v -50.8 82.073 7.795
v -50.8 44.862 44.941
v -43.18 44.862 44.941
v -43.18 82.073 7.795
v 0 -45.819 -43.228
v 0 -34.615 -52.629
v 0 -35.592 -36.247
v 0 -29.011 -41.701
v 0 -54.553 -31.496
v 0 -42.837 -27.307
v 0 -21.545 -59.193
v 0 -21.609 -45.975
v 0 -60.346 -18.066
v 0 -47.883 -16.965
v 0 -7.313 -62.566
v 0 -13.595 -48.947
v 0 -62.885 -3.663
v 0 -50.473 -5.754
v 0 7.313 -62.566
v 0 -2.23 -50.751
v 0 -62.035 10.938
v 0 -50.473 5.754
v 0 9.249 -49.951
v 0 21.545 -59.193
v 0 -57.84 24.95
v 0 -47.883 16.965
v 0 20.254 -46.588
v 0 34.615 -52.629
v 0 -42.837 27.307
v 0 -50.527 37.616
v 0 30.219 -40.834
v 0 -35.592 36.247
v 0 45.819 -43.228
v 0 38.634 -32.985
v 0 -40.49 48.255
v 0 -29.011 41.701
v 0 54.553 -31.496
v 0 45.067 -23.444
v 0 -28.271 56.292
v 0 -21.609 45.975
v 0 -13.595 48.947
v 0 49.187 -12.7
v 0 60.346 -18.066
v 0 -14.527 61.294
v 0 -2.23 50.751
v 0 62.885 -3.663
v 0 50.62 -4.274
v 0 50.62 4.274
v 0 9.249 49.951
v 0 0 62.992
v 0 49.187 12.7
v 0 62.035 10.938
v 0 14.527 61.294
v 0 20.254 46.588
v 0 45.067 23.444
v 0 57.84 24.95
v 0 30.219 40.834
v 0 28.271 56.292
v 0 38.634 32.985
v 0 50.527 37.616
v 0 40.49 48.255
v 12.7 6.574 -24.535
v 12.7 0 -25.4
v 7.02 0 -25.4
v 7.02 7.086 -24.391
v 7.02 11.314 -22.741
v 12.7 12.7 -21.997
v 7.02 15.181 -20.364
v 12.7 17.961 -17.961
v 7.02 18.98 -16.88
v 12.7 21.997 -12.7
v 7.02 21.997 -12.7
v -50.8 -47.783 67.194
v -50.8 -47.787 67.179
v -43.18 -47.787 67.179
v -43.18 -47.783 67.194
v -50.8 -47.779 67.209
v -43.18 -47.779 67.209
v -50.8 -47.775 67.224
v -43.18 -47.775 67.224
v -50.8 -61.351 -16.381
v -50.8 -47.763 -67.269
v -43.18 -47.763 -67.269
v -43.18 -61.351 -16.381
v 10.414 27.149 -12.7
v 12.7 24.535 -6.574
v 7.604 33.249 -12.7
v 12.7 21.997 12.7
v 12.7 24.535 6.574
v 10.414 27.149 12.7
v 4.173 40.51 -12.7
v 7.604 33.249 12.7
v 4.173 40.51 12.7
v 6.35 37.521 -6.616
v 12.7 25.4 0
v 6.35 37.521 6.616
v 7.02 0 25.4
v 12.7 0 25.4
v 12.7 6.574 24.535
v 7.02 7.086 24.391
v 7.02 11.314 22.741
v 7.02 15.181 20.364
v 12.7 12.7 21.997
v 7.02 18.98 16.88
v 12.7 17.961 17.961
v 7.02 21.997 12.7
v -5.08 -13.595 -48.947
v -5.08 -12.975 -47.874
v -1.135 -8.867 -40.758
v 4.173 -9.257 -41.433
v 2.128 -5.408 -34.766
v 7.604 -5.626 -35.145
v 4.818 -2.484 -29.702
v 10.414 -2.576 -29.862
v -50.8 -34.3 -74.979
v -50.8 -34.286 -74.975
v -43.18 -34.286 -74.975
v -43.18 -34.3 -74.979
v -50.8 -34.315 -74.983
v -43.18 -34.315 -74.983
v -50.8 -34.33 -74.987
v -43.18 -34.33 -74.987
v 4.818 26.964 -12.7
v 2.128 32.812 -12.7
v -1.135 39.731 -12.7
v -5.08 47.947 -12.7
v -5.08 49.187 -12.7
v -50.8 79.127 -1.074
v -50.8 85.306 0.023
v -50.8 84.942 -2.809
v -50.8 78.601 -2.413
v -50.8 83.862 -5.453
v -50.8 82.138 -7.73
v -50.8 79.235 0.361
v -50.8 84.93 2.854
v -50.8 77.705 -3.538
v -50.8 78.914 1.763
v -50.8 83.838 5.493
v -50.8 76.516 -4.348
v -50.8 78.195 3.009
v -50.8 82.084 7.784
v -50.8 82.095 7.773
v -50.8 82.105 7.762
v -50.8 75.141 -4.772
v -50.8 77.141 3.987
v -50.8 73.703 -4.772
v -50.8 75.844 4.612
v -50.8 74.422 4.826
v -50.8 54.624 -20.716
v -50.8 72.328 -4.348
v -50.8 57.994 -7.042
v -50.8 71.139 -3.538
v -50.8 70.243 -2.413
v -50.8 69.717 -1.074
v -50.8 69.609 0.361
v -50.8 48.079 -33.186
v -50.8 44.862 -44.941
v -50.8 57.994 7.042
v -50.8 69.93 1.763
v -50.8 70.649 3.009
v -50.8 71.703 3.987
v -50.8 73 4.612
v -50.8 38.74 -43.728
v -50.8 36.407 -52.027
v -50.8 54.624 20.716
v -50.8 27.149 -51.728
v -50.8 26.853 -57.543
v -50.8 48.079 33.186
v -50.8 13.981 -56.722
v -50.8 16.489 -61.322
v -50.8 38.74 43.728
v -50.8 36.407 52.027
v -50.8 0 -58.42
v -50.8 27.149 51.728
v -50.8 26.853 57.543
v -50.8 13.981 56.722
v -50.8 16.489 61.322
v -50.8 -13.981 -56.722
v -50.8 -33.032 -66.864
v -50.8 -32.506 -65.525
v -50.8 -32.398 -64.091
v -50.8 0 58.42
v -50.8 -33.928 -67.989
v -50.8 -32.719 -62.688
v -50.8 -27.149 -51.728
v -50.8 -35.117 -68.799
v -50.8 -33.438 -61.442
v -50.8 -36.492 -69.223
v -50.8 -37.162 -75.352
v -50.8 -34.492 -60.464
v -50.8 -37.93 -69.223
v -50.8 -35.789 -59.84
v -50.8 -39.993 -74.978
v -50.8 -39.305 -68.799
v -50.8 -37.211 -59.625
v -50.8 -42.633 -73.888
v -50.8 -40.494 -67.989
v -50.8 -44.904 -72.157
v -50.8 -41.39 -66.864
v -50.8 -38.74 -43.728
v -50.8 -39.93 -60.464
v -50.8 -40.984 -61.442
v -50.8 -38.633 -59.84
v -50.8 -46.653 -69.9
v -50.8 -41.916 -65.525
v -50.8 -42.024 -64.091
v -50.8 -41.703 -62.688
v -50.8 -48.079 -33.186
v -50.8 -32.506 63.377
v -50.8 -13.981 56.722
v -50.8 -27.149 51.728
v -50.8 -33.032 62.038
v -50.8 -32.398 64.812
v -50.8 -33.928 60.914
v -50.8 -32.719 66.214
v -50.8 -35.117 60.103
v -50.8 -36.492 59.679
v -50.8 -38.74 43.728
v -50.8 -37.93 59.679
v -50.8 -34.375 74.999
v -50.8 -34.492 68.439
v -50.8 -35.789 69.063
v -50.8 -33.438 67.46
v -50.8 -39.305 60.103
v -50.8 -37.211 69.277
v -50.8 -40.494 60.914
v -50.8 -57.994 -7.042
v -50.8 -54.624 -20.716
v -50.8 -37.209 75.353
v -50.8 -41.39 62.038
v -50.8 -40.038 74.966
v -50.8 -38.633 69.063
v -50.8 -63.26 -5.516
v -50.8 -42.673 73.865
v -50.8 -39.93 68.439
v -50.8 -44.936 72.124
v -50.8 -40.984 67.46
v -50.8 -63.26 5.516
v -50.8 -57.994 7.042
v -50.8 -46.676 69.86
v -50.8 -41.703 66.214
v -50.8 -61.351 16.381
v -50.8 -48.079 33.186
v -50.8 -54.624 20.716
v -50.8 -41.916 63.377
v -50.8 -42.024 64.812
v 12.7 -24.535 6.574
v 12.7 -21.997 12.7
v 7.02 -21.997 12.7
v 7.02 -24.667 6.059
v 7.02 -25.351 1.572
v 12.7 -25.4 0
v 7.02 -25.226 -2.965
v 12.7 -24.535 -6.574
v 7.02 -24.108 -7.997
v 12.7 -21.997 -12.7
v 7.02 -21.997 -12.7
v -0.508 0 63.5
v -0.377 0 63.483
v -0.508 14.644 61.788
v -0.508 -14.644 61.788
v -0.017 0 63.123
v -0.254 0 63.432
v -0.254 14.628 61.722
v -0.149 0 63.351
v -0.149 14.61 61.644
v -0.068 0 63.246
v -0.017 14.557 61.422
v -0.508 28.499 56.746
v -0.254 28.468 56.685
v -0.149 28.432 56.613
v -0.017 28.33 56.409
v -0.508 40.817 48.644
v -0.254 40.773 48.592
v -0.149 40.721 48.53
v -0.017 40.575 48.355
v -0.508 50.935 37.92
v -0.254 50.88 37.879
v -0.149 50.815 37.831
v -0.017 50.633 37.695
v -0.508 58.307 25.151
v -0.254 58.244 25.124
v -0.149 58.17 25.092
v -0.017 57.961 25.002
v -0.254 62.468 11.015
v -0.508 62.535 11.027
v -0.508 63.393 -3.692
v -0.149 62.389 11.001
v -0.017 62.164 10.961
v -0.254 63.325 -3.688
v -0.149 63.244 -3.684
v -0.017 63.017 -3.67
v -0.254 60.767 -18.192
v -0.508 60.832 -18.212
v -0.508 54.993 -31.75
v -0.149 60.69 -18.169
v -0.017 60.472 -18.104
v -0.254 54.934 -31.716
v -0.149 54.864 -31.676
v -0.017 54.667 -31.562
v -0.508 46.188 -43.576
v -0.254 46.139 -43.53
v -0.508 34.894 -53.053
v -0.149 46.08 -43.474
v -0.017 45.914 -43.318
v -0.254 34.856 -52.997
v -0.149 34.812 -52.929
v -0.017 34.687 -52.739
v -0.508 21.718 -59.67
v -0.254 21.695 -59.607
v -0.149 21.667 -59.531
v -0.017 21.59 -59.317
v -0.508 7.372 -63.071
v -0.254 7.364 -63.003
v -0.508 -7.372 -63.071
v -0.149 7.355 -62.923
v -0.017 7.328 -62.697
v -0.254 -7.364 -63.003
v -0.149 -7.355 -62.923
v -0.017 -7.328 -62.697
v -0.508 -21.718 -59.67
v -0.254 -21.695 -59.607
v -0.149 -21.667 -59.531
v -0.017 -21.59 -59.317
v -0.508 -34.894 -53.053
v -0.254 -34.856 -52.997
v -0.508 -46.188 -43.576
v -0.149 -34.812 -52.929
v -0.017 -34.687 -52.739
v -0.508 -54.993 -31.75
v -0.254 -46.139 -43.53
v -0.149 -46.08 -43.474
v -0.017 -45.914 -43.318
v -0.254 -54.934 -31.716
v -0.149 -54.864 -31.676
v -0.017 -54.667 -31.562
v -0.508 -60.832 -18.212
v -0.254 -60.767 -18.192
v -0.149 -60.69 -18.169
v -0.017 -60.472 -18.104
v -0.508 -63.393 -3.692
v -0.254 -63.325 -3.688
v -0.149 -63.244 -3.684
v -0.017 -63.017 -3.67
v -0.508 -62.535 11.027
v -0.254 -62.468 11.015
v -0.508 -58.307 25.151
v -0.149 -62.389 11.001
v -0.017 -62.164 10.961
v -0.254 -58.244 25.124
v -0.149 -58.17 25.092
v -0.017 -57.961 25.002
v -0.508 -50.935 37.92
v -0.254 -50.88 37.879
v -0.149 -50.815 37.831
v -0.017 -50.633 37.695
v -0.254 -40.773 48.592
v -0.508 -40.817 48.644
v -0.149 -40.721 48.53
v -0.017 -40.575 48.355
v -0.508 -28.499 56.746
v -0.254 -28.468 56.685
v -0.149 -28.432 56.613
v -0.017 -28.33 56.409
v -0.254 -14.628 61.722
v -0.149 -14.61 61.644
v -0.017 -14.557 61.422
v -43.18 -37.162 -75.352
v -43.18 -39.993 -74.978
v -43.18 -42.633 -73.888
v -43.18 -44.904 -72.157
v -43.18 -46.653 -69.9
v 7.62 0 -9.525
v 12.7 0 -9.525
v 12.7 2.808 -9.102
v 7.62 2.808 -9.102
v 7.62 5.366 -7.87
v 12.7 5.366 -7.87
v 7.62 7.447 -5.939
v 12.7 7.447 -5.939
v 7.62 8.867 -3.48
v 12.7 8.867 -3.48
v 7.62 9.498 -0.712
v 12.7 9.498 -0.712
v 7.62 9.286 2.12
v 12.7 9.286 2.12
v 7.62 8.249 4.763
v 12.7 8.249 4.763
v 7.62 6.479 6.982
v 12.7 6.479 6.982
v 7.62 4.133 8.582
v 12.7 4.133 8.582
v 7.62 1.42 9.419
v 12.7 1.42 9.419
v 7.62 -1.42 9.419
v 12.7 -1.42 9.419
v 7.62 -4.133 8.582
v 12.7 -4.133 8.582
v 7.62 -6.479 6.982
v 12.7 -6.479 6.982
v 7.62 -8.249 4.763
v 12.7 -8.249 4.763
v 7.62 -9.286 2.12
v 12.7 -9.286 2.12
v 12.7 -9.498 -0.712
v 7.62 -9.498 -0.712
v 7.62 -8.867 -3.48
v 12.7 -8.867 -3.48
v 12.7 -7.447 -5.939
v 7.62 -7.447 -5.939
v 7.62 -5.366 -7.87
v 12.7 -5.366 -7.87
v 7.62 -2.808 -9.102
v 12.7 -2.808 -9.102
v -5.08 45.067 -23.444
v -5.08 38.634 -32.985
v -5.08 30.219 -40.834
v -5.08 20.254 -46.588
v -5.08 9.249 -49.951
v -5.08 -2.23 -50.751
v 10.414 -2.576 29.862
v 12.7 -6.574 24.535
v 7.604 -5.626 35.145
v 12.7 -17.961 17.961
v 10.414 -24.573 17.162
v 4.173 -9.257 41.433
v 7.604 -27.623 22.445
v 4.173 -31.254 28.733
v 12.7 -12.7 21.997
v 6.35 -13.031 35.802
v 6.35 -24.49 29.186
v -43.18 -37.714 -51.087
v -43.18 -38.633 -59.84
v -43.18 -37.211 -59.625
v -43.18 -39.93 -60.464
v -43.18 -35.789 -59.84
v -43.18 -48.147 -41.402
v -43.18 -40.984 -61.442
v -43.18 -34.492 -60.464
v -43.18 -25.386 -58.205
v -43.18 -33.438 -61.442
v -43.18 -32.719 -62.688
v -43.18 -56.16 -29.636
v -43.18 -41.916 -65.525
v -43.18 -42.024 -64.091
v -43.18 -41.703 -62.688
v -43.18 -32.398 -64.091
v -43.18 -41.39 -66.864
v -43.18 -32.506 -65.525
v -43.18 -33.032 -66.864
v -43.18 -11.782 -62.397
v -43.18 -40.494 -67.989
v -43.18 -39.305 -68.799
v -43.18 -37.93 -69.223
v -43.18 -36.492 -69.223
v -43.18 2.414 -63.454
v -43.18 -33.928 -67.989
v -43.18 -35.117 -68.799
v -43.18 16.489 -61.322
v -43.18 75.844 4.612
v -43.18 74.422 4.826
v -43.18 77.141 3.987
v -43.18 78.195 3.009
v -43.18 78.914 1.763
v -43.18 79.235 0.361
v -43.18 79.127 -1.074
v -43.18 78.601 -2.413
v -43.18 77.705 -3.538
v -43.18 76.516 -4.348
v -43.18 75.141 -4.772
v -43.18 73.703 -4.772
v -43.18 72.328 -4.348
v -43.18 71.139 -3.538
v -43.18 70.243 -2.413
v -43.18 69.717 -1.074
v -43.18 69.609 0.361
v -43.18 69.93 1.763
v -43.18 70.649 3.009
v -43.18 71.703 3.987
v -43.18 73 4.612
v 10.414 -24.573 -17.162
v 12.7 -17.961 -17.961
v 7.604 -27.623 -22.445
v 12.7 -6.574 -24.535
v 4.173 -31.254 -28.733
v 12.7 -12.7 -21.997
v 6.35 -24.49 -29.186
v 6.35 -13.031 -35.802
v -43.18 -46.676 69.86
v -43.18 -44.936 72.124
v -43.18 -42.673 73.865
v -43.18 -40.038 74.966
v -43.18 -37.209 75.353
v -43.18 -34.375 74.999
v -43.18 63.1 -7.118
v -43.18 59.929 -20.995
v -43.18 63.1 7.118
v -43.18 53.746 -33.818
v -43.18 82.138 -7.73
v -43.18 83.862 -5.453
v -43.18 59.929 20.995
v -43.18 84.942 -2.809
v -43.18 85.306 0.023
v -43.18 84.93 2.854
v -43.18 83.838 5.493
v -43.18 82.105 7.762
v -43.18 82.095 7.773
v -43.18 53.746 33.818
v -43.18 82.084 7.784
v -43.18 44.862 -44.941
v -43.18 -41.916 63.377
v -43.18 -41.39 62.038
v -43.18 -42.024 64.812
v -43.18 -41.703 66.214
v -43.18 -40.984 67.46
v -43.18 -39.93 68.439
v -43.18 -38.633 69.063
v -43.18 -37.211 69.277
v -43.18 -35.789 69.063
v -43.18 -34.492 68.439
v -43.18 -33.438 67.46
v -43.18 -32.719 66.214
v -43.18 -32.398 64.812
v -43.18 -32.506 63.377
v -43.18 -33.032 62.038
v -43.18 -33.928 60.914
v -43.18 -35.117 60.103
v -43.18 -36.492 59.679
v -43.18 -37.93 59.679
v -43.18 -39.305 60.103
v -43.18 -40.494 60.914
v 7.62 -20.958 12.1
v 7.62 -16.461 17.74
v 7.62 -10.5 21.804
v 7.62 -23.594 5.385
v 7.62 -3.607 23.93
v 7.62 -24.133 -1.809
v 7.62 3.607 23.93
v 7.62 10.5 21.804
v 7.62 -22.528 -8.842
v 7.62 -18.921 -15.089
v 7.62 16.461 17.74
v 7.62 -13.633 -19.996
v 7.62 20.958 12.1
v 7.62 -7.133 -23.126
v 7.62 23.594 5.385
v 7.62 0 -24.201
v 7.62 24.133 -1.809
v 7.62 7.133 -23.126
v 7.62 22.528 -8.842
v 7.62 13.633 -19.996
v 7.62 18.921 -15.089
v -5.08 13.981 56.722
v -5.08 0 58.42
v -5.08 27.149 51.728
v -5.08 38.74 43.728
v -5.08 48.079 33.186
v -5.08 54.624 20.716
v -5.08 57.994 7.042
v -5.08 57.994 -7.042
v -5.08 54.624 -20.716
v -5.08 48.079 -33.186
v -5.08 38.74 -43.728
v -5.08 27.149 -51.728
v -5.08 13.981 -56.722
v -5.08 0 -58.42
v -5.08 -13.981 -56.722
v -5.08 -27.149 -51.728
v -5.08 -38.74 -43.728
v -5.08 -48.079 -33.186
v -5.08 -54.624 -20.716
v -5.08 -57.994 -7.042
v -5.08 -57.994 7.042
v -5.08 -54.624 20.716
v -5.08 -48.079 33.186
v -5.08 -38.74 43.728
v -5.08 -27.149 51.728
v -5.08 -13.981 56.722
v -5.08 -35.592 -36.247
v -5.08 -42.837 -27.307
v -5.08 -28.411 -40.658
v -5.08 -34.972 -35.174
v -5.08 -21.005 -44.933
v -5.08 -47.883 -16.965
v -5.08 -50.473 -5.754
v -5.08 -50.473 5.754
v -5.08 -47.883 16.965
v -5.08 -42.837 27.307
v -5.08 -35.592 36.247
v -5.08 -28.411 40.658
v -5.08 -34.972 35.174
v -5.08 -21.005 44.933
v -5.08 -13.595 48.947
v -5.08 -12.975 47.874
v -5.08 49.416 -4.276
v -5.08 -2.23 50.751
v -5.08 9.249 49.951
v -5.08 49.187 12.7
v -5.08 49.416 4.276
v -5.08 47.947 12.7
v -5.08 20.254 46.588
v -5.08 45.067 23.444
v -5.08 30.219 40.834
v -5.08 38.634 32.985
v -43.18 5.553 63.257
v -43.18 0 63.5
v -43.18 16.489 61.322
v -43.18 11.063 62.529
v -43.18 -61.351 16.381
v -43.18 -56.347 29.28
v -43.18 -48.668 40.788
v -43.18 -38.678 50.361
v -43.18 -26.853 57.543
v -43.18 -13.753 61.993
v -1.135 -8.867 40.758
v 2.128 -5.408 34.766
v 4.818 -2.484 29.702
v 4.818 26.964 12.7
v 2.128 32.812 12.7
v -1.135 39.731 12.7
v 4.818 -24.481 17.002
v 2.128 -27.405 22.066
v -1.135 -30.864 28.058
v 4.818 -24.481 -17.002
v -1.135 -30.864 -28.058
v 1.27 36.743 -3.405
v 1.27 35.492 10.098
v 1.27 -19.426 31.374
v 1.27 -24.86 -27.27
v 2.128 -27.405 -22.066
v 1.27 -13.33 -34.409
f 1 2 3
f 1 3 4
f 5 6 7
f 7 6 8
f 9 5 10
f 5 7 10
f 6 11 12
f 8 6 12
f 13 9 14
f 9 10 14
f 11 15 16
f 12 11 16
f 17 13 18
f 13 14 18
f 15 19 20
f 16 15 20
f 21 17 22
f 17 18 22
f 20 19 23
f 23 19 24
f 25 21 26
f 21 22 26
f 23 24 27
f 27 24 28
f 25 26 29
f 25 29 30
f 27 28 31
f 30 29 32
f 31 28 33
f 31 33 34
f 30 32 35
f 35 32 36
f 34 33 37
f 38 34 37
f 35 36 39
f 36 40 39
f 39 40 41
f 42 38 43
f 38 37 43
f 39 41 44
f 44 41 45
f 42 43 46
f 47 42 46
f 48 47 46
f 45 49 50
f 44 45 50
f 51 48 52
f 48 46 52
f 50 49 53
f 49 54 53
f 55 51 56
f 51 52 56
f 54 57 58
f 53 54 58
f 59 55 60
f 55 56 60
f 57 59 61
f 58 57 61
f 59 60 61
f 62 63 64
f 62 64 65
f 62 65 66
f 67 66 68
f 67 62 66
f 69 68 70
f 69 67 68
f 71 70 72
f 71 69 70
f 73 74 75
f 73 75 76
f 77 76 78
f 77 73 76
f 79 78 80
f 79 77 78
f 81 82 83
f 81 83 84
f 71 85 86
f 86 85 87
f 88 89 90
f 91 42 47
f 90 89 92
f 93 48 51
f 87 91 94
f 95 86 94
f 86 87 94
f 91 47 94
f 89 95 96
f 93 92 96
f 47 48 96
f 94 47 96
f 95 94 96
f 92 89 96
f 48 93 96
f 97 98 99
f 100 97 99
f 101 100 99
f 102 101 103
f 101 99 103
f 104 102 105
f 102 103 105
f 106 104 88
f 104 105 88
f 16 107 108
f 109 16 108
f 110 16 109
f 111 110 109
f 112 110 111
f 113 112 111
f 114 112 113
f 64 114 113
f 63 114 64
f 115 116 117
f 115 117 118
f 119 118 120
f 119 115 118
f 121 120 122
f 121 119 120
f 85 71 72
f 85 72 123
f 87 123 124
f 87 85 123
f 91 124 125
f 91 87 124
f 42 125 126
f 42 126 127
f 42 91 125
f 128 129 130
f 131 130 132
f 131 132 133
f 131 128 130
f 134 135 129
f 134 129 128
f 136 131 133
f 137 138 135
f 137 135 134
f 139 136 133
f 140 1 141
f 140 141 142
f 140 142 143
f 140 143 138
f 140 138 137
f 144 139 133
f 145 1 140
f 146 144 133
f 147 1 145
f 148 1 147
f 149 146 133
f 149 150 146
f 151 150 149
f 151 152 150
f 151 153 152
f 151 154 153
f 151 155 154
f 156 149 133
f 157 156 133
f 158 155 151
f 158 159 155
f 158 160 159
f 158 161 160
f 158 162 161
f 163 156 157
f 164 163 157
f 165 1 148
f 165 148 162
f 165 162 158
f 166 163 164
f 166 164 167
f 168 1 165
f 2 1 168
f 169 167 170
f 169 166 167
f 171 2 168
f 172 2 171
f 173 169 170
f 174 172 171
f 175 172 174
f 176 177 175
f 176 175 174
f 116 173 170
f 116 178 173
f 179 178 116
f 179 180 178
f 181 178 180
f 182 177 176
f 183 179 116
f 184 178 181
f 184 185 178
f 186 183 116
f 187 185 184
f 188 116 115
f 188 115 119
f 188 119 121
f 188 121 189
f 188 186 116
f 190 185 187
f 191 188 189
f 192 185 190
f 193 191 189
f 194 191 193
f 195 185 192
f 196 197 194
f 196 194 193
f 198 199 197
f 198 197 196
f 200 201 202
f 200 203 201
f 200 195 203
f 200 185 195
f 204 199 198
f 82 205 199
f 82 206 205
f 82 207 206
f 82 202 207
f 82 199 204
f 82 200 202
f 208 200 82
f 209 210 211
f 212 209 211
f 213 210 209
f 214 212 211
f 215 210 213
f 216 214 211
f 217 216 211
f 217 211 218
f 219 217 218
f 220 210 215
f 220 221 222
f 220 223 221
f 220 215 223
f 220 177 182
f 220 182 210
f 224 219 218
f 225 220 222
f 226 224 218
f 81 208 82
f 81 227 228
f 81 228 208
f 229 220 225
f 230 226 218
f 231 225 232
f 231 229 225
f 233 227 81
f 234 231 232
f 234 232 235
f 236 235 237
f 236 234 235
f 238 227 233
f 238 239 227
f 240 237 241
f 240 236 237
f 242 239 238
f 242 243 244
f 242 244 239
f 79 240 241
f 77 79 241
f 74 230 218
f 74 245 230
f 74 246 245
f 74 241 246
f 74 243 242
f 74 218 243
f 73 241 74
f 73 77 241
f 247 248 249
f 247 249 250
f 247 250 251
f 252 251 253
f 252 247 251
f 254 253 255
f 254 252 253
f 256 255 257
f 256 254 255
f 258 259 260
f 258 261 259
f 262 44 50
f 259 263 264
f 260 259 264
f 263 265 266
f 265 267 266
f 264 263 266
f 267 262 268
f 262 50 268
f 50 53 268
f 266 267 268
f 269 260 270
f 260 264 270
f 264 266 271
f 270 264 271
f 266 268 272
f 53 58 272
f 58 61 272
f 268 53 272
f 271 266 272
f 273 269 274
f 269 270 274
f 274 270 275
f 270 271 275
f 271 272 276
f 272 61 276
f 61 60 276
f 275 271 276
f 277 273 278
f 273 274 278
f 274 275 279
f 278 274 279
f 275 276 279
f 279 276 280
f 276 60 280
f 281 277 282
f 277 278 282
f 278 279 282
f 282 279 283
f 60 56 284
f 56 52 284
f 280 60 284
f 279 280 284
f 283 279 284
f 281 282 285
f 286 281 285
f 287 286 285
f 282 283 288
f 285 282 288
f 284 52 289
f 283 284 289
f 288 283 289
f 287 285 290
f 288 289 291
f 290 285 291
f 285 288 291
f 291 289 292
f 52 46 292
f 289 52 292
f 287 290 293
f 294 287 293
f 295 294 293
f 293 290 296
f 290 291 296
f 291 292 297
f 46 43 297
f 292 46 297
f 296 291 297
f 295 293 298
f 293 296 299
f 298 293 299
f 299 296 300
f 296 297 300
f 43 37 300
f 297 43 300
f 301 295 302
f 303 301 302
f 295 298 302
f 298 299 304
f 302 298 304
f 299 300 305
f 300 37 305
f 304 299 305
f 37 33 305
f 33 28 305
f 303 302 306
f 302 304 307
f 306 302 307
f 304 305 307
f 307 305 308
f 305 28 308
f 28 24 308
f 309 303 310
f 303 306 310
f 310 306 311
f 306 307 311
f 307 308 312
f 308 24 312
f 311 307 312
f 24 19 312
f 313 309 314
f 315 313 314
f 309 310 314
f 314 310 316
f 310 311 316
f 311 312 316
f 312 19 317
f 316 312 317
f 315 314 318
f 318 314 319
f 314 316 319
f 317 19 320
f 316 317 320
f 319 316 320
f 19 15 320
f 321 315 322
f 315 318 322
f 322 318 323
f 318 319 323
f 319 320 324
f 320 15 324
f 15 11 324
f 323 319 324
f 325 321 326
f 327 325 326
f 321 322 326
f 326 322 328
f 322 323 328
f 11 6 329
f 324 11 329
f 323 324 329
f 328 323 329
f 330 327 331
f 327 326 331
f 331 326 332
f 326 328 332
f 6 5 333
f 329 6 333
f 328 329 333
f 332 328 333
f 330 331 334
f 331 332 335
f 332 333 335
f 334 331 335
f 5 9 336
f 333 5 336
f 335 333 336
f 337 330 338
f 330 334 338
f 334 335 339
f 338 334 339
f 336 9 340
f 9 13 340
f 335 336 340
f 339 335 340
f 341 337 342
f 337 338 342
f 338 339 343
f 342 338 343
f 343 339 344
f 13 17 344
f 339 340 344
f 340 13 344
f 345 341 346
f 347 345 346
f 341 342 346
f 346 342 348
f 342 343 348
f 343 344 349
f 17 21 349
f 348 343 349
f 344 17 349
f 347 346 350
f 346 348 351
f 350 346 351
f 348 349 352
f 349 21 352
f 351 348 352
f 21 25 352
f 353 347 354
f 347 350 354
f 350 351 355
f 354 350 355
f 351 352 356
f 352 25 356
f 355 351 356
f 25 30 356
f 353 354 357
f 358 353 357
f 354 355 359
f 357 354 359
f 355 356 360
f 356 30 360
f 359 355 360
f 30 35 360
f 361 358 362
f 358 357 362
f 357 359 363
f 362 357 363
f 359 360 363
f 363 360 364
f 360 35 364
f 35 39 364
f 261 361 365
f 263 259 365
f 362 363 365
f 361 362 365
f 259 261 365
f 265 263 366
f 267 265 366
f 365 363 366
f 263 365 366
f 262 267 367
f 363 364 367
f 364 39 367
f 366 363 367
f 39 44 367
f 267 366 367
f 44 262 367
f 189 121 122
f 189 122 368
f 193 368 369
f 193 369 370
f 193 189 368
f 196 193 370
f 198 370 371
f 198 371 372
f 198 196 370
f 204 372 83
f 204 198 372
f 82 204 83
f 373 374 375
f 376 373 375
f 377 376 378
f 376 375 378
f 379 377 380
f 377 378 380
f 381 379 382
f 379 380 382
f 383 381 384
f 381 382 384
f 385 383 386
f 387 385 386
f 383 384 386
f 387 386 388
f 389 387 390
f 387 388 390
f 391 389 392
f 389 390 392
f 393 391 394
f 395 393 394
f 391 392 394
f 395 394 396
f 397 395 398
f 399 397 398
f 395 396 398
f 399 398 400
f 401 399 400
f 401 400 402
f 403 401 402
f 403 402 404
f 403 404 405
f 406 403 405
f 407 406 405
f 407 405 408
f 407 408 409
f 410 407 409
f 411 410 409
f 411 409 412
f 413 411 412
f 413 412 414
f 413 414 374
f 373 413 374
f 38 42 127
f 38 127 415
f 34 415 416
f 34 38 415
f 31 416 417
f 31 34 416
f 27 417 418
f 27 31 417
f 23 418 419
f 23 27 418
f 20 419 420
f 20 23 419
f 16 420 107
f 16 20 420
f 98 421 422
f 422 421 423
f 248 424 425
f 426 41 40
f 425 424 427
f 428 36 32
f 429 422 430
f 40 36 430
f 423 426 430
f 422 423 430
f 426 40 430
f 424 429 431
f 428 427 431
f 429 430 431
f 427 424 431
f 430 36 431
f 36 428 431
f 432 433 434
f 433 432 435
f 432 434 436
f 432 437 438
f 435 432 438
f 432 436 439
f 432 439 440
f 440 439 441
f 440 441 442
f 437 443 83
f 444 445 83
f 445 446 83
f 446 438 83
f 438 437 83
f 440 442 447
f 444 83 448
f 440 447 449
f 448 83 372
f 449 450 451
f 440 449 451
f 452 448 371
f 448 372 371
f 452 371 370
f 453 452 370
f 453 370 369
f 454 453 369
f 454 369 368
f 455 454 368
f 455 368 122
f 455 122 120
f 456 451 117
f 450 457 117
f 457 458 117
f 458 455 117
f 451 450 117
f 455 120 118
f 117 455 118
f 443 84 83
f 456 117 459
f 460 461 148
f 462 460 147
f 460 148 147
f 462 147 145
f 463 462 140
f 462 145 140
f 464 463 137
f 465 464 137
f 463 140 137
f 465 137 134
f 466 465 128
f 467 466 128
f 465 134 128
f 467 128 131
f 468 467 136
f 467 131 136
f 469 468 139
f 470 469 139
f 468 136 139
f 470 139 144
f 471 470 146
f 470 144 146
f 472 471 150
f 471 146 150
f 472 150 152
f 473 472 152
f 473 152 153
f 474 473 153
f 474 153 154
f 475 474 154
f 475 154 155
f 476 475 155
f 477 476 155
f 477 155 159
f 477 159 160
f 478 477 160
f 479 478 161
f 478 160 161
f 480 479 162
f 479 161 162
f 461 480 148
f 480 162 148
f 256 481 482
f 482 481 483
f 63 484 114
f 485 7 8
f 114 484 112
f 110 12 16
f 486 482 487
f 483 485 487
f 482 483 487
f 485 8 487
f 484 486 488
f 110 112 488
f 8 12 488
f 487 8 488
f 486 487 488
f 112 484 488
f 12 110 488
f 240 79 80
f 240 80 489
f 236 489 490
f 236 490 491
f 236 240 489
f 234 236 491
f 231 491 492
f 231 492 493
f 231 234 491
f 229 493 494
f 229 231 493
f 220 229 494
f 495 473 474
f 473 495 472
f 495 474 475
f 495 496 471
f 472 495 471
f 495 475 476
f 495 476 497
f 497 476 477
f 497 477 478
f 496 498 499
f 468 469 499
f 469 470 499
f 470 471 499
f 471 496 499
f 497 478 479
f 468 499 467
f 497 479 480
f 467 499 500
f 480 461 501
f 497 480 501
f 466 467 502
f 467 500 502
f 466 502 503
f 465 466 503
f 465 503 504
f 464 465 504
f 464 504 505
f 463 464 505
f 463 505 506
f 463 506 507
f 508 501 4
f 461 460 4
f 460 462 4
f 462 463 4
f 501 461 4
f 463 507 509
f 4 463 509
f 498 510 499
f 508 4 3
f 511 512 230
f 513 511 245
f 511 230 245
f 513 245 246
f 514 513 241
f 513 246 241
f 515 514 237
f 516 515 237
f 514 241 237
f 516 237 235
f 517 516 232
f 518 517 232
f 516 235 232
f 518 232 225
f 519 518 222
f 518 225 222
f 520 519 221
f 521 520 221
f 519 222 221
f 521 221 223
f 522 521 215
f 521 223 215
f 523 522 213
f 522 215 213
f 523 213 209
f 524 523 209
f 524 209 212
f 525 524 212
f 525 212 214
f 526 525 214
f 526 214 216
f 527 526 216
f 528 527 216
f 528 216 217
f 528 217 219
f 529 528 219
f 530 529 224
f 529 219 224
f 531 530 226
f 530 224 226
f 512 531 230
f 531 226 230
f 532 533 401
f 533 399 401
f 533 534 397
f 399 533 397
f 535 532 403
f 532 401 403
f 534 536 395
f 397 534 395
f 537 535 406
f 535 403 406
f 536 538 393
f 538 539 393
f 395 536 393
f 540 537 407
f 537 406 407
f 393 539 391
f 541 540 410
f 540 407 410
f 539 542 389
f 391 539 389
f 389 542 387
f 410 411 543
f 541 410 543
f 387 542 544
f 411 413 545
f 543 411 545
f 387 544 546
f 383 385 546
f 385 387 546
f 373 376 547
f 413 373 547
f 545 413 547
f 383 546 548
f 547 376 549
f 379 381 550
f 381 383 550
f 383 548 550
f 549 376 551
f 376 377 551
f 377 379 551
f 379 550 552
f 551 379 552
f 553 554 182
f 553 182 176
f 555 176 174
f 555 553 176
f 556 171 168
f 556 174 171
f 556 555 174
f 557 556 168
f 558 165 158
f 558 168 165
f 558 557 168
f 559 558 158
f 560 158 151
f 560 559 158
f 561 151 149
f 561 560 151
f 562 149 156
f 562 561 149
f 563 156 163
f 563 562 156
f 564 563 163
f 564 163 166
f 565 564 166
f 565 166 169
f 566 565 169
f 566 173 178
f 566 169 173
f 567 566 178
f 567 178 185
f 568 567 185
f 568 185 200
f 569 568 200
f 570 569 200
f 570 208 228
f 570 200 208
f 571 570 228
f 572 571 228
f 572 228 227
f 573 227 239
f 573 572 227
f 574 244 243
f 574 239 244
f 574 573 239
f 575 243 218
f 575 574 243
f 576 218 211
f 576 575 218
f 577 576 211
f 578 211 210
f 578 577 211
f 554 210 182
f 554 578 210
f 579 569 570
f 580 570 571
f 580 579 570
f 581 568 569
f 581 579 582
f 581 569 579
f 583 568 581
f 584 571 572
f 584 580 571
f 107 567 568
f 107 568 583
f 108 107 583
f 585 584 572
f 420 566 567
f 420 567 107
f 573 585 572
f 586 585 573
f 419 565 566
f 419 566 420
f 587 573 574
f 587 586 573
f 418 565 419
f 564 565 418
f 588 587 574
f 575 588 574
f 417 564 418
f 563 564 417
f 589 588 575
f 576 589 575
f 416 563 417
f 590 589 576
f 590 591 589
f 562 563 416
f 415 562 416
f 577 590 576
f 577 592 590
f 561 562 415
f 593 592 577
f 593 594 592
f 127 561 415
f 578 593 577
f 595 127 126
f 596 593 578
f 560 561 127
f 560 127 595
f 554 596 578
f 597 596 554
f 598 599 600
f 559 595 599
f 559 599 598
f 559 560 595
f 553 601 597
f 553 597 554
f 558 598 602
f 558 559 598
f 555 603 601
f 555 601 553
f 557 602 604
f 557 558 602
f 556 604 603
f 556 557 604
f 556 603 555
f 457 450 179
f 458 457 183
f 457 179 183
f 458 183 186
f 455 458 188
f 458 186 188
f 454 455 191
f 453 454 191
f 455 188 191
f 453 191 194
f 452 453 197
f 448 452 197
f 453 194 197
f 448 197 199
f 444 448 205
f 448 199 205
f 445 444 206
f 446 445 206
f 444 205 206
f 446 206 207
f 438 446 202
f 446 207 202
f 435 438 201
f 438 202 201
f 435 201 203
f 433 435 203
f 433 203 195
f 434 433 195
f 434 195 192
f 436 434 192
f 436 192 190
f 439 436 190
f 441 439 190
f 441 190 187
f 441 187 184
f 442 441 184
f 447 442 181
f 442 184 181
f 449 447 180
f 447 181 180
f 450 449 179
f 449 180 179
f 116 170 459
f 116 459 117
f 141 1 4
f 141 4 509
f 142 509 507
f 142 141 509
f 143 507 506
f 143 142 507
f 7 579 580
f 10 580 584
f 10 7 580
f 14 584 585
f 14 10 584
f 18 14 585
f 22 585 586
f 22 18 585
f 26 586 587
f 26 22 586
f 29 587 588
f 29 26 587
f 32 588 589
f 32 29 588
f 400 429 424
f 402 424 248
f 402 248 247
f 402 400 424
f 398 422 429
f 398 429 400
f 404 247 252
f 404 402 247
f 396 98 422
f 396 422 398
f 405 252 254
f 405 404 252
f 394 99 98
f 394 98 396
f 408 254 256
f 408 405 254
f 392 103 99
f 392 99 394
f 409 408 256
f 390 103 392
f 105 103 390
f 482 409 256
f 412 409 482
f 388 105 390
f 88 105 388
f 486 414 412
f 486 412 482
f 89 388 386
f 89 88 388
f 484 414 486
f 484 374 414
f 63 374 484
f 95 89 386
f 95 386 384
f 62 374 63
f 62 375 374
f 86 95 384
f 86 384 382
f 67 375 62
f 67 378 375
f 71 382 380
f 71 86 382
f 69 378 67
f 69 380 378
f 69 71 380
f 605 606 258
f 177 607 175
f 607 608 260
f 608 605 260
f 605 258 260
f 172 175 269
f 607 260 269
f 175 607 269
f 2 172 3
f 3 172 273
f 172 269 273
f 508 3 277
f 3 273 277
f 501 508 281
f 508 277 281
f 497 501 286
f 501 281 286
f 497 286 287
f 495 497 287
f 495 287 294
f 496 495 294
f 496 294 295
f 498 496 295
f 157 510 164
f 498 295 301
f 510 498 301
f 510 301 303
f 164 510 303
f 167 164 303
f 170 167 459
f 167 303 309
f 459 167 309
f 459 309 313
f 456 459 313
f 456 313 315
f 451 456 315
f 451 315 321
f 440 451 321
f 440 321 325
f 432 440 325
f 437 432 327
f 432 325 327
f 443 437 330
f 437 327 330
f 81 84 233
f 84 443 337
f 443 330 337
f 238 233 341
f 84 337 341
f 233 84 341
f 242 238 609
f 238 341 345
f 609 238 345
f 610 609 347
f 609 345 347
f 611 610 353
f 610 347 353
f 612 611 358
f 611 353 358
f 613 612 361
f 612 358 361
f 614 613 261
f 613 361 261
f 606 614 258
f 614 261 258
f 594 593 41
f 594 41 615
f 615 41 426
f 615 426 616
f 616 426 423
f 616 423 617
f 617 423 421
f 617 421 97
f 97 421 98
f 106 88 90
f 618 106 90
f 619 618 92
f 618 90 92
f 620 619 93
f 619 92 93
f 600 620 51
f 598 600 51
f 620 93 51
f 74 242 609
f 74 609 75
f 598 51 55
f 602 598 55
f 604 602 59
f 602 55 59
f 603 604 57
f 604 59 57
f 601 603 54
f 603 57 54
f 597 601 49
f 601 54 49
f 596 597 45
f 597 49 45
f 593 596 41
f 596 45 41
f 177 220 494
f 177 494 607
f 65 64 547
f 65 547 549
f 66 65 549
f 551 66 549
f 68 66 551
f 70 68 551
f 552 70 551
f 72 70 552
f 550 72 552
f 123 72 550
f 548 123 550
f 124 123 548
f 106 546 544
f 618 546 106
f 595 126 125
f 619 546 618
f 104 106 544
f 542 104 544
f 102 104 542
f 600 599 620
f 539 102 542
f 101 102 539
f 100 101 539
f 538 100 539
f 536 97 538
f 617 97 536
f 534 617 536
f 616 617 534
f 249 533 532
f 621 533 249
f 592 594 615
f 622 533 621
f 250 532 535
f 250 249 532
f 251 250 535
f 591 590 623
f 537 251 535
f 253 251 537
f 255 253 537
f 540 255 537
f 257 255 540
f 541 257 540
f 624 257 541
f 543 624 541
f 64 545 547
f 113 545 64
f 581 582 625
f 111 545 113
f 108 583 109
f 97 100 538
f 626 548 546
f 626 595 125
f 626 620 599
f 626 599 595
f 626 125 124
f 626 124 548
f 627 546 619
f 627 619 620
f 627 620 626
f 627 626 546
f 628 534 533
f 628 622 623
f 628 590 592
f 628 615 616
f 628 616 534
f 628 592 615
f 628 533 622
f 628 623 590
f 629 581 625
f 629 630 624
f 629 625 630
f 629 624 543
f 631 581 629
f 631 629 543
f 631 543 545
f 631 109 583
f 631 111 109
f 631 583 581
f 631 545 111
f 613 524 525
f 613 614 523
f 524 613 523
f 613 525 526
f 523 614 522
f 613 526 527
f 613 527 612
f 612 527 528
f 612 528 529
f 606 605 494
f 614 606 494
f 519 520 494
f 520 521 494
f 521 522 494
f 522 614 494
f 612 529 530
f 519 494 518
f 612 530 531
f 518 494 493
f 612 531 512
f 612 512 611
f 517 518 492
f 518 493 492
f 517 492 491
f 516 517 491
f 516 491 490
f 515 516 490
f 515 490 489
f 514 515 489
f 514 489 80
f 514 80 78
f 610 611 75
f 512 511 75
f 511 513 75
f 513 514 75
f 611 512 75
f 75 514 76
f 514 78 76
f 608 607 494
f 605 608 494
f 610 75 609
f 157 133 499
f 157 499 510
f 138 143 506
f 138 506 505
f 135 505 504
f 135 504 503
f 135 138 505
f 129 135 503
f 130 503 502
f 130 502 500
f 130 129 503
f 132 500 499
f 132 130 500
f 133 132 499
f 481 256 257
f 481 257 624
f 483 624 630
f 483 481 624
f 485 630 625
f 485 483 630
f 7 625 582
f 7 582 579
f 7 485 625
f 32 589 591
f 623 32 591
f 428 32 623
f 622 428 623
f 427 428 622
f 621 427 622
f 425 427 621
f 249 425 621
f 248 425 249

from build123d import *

# Parameters (mm, degrees)
SKETCH3_R           = 25.4
SKETCH1_R           = 50.8
SKETCH4_R           = 63.5
BOSS_EXTRUDE1_DEPTH = 50.8
SHELL1_T            = -5.08
CUT_EXTRUDE1_DEPTH  = 50.8
SKETCH6_R           = 4.826
BOSS_EXTRUDE3_DEPTH = 7.62
FILLET1_R           = 0.508
SKETCH7_R           = 9.525
CUT_EXTRUDE2_DEPTH  = 124.861079859
CIRPATTERN2_COUNT   = 3


with BuildPart() as part:
    # Sketch3 → Loft1 section 0
    with BuildSketch(Plane(origin=(12.7, 0, 0), x_dir=(0, 0, -1), z_dir=(1, 0, 0))):
        Circle(SKETCH3_R)
    # Sketch1 → Loft1 section 1
    with BuildSketch(Plane(origin=(0, 0, 0), x_dir=(0, 0, -1), z_dir=(1, 0, 0))):
        Circle(SKETCH1_R)
    loft()

    # Sketch4 → Boss-Extrude1 (add)
    with BuildSketch(Plane.ZY):
        Circle(SKETCH4_R)
    extrude(amount=BOSS_EXTRUDE1_DEPTH)

    # Shell1
    shell1_openings = [part.faces().sort_by_distance(p)[0] for p in [
        (-50.8, 0, 0),
    ]]
    offset(amount=SHELL1_T, openings=shell1_openings, kind=Kind.INTERSECTION)

    # Sketch5 → Cut-Extrude1 (cut)
    with BuildSketch(Plane(origin=(12.7, 0, 0), x_dir=(0, 0, -1), z_dir=(1, 0, 0))):
        with BuildLine():
            Line((-12.7, 21.997045256), (-12.7, 49.186888497))
            ThreePointArc((-12.7, 49.186888497), (-43.994090512, 25.4), (-48.947094971, -13.59492162))
            Line((-48.947094971, -13.59492162), (-25.4, 0))
            ThreePointArc((-25.4, 0), (-21.997045256, 12.7), (-12.7, 21.997045256))
        make_face()
        with BuildLine():
            Line((12.7, 21.997045256), (12.7, 49.186888497))
            ThreePointArc((12.7, 49.186888497), (43.994090512, 25.4), (48.947094971, -13.59492162))
            Line((48.947094971, -13.59492162), (25.4, 0))
            ThreePointArc((25.4, 0), (21.997045256, 12.7), (12.7, 21.997045256))
        make_face()
        with BuildLine():
            Line((12.7, -21.997045256), (36.247094971, -35.591966876))
            ThreePointArc((36.247094971, -35.591966876), (0, -50.8), (-36.247094971, -35.591966876))
            Line((-36.247094971, -35.591966876), (-12.7, -21.997045256))
            ThreePointArc((-12.7, -21.997045256), (0, -25.4), (12.7, -21.997045256))
        make_face()
    extrude(amount=-CUT_EXTRUDE1_DEPTH, mode=Mode.SUBTRACT)

    # Sketch6 → Boss-Extrude3 (add)
    with BuildSketch(Plane.ZY.offset(50.8)):
        with BuildLine():
            ThreePointArc((7.762367521, 82.105471512), (0.023010453, 85.305702571), (-7.729809299, 82.138225256))
            Line((-7.729809299, 82.138225256), (-44.940751738, 44.861774744))
            ThreePointArc((-44.940751738, 44.861774744), (0, 63.5), (44.940751738, 44.861774744))
            Line((44.940751738, 44.861774744), (7.79520225, 82.072717183))
            ThreePointArc((7.79520225, 82.072717183), (7.778802125, 82.089111629), (7.762367521, 82.105471512))
        make_face()
        with Locations((0, 74.422)):
            Circle(SKETCH6_R, mode=Mode.SUBTRACT)
    boss_extrude3 = extrude(amount=-BOSS_EXTRUDE3_DEPTH)

    # Fillet1
    fillet1_edges = [part.edges().sort_by_distance(p)[0] for p in [
        (0, 0, -63.5),
    ]]
    fillet(fillet1_edges, radius=FILLET1_R)

    # Sketch7 → Cut-Extrude2 (cut, through all)
    with BuildSketch(Plane(origin=(12.7, 0, 0), x_dir=(0, 0, -1), z_dir=(1, 0, 0))):
        Circle(SKETCH7_R)
    extrude(amount=-CUT_EXTRUDE2_DEPTH, mode=Mode.SUBTRACT)

    # CirPattern2: Boss-Extrude3 ×3 about axis
    cirpattern2_axis = Axis((0, 0, 0), (1, 0, 0))
    for i in range(1, CIRPATTERN2_COUNT):
        add(boss_extrude3.rotate(cirpattern2_axis, i * 360 / CIRPATTERN2_COUNT))


solid = part.part
